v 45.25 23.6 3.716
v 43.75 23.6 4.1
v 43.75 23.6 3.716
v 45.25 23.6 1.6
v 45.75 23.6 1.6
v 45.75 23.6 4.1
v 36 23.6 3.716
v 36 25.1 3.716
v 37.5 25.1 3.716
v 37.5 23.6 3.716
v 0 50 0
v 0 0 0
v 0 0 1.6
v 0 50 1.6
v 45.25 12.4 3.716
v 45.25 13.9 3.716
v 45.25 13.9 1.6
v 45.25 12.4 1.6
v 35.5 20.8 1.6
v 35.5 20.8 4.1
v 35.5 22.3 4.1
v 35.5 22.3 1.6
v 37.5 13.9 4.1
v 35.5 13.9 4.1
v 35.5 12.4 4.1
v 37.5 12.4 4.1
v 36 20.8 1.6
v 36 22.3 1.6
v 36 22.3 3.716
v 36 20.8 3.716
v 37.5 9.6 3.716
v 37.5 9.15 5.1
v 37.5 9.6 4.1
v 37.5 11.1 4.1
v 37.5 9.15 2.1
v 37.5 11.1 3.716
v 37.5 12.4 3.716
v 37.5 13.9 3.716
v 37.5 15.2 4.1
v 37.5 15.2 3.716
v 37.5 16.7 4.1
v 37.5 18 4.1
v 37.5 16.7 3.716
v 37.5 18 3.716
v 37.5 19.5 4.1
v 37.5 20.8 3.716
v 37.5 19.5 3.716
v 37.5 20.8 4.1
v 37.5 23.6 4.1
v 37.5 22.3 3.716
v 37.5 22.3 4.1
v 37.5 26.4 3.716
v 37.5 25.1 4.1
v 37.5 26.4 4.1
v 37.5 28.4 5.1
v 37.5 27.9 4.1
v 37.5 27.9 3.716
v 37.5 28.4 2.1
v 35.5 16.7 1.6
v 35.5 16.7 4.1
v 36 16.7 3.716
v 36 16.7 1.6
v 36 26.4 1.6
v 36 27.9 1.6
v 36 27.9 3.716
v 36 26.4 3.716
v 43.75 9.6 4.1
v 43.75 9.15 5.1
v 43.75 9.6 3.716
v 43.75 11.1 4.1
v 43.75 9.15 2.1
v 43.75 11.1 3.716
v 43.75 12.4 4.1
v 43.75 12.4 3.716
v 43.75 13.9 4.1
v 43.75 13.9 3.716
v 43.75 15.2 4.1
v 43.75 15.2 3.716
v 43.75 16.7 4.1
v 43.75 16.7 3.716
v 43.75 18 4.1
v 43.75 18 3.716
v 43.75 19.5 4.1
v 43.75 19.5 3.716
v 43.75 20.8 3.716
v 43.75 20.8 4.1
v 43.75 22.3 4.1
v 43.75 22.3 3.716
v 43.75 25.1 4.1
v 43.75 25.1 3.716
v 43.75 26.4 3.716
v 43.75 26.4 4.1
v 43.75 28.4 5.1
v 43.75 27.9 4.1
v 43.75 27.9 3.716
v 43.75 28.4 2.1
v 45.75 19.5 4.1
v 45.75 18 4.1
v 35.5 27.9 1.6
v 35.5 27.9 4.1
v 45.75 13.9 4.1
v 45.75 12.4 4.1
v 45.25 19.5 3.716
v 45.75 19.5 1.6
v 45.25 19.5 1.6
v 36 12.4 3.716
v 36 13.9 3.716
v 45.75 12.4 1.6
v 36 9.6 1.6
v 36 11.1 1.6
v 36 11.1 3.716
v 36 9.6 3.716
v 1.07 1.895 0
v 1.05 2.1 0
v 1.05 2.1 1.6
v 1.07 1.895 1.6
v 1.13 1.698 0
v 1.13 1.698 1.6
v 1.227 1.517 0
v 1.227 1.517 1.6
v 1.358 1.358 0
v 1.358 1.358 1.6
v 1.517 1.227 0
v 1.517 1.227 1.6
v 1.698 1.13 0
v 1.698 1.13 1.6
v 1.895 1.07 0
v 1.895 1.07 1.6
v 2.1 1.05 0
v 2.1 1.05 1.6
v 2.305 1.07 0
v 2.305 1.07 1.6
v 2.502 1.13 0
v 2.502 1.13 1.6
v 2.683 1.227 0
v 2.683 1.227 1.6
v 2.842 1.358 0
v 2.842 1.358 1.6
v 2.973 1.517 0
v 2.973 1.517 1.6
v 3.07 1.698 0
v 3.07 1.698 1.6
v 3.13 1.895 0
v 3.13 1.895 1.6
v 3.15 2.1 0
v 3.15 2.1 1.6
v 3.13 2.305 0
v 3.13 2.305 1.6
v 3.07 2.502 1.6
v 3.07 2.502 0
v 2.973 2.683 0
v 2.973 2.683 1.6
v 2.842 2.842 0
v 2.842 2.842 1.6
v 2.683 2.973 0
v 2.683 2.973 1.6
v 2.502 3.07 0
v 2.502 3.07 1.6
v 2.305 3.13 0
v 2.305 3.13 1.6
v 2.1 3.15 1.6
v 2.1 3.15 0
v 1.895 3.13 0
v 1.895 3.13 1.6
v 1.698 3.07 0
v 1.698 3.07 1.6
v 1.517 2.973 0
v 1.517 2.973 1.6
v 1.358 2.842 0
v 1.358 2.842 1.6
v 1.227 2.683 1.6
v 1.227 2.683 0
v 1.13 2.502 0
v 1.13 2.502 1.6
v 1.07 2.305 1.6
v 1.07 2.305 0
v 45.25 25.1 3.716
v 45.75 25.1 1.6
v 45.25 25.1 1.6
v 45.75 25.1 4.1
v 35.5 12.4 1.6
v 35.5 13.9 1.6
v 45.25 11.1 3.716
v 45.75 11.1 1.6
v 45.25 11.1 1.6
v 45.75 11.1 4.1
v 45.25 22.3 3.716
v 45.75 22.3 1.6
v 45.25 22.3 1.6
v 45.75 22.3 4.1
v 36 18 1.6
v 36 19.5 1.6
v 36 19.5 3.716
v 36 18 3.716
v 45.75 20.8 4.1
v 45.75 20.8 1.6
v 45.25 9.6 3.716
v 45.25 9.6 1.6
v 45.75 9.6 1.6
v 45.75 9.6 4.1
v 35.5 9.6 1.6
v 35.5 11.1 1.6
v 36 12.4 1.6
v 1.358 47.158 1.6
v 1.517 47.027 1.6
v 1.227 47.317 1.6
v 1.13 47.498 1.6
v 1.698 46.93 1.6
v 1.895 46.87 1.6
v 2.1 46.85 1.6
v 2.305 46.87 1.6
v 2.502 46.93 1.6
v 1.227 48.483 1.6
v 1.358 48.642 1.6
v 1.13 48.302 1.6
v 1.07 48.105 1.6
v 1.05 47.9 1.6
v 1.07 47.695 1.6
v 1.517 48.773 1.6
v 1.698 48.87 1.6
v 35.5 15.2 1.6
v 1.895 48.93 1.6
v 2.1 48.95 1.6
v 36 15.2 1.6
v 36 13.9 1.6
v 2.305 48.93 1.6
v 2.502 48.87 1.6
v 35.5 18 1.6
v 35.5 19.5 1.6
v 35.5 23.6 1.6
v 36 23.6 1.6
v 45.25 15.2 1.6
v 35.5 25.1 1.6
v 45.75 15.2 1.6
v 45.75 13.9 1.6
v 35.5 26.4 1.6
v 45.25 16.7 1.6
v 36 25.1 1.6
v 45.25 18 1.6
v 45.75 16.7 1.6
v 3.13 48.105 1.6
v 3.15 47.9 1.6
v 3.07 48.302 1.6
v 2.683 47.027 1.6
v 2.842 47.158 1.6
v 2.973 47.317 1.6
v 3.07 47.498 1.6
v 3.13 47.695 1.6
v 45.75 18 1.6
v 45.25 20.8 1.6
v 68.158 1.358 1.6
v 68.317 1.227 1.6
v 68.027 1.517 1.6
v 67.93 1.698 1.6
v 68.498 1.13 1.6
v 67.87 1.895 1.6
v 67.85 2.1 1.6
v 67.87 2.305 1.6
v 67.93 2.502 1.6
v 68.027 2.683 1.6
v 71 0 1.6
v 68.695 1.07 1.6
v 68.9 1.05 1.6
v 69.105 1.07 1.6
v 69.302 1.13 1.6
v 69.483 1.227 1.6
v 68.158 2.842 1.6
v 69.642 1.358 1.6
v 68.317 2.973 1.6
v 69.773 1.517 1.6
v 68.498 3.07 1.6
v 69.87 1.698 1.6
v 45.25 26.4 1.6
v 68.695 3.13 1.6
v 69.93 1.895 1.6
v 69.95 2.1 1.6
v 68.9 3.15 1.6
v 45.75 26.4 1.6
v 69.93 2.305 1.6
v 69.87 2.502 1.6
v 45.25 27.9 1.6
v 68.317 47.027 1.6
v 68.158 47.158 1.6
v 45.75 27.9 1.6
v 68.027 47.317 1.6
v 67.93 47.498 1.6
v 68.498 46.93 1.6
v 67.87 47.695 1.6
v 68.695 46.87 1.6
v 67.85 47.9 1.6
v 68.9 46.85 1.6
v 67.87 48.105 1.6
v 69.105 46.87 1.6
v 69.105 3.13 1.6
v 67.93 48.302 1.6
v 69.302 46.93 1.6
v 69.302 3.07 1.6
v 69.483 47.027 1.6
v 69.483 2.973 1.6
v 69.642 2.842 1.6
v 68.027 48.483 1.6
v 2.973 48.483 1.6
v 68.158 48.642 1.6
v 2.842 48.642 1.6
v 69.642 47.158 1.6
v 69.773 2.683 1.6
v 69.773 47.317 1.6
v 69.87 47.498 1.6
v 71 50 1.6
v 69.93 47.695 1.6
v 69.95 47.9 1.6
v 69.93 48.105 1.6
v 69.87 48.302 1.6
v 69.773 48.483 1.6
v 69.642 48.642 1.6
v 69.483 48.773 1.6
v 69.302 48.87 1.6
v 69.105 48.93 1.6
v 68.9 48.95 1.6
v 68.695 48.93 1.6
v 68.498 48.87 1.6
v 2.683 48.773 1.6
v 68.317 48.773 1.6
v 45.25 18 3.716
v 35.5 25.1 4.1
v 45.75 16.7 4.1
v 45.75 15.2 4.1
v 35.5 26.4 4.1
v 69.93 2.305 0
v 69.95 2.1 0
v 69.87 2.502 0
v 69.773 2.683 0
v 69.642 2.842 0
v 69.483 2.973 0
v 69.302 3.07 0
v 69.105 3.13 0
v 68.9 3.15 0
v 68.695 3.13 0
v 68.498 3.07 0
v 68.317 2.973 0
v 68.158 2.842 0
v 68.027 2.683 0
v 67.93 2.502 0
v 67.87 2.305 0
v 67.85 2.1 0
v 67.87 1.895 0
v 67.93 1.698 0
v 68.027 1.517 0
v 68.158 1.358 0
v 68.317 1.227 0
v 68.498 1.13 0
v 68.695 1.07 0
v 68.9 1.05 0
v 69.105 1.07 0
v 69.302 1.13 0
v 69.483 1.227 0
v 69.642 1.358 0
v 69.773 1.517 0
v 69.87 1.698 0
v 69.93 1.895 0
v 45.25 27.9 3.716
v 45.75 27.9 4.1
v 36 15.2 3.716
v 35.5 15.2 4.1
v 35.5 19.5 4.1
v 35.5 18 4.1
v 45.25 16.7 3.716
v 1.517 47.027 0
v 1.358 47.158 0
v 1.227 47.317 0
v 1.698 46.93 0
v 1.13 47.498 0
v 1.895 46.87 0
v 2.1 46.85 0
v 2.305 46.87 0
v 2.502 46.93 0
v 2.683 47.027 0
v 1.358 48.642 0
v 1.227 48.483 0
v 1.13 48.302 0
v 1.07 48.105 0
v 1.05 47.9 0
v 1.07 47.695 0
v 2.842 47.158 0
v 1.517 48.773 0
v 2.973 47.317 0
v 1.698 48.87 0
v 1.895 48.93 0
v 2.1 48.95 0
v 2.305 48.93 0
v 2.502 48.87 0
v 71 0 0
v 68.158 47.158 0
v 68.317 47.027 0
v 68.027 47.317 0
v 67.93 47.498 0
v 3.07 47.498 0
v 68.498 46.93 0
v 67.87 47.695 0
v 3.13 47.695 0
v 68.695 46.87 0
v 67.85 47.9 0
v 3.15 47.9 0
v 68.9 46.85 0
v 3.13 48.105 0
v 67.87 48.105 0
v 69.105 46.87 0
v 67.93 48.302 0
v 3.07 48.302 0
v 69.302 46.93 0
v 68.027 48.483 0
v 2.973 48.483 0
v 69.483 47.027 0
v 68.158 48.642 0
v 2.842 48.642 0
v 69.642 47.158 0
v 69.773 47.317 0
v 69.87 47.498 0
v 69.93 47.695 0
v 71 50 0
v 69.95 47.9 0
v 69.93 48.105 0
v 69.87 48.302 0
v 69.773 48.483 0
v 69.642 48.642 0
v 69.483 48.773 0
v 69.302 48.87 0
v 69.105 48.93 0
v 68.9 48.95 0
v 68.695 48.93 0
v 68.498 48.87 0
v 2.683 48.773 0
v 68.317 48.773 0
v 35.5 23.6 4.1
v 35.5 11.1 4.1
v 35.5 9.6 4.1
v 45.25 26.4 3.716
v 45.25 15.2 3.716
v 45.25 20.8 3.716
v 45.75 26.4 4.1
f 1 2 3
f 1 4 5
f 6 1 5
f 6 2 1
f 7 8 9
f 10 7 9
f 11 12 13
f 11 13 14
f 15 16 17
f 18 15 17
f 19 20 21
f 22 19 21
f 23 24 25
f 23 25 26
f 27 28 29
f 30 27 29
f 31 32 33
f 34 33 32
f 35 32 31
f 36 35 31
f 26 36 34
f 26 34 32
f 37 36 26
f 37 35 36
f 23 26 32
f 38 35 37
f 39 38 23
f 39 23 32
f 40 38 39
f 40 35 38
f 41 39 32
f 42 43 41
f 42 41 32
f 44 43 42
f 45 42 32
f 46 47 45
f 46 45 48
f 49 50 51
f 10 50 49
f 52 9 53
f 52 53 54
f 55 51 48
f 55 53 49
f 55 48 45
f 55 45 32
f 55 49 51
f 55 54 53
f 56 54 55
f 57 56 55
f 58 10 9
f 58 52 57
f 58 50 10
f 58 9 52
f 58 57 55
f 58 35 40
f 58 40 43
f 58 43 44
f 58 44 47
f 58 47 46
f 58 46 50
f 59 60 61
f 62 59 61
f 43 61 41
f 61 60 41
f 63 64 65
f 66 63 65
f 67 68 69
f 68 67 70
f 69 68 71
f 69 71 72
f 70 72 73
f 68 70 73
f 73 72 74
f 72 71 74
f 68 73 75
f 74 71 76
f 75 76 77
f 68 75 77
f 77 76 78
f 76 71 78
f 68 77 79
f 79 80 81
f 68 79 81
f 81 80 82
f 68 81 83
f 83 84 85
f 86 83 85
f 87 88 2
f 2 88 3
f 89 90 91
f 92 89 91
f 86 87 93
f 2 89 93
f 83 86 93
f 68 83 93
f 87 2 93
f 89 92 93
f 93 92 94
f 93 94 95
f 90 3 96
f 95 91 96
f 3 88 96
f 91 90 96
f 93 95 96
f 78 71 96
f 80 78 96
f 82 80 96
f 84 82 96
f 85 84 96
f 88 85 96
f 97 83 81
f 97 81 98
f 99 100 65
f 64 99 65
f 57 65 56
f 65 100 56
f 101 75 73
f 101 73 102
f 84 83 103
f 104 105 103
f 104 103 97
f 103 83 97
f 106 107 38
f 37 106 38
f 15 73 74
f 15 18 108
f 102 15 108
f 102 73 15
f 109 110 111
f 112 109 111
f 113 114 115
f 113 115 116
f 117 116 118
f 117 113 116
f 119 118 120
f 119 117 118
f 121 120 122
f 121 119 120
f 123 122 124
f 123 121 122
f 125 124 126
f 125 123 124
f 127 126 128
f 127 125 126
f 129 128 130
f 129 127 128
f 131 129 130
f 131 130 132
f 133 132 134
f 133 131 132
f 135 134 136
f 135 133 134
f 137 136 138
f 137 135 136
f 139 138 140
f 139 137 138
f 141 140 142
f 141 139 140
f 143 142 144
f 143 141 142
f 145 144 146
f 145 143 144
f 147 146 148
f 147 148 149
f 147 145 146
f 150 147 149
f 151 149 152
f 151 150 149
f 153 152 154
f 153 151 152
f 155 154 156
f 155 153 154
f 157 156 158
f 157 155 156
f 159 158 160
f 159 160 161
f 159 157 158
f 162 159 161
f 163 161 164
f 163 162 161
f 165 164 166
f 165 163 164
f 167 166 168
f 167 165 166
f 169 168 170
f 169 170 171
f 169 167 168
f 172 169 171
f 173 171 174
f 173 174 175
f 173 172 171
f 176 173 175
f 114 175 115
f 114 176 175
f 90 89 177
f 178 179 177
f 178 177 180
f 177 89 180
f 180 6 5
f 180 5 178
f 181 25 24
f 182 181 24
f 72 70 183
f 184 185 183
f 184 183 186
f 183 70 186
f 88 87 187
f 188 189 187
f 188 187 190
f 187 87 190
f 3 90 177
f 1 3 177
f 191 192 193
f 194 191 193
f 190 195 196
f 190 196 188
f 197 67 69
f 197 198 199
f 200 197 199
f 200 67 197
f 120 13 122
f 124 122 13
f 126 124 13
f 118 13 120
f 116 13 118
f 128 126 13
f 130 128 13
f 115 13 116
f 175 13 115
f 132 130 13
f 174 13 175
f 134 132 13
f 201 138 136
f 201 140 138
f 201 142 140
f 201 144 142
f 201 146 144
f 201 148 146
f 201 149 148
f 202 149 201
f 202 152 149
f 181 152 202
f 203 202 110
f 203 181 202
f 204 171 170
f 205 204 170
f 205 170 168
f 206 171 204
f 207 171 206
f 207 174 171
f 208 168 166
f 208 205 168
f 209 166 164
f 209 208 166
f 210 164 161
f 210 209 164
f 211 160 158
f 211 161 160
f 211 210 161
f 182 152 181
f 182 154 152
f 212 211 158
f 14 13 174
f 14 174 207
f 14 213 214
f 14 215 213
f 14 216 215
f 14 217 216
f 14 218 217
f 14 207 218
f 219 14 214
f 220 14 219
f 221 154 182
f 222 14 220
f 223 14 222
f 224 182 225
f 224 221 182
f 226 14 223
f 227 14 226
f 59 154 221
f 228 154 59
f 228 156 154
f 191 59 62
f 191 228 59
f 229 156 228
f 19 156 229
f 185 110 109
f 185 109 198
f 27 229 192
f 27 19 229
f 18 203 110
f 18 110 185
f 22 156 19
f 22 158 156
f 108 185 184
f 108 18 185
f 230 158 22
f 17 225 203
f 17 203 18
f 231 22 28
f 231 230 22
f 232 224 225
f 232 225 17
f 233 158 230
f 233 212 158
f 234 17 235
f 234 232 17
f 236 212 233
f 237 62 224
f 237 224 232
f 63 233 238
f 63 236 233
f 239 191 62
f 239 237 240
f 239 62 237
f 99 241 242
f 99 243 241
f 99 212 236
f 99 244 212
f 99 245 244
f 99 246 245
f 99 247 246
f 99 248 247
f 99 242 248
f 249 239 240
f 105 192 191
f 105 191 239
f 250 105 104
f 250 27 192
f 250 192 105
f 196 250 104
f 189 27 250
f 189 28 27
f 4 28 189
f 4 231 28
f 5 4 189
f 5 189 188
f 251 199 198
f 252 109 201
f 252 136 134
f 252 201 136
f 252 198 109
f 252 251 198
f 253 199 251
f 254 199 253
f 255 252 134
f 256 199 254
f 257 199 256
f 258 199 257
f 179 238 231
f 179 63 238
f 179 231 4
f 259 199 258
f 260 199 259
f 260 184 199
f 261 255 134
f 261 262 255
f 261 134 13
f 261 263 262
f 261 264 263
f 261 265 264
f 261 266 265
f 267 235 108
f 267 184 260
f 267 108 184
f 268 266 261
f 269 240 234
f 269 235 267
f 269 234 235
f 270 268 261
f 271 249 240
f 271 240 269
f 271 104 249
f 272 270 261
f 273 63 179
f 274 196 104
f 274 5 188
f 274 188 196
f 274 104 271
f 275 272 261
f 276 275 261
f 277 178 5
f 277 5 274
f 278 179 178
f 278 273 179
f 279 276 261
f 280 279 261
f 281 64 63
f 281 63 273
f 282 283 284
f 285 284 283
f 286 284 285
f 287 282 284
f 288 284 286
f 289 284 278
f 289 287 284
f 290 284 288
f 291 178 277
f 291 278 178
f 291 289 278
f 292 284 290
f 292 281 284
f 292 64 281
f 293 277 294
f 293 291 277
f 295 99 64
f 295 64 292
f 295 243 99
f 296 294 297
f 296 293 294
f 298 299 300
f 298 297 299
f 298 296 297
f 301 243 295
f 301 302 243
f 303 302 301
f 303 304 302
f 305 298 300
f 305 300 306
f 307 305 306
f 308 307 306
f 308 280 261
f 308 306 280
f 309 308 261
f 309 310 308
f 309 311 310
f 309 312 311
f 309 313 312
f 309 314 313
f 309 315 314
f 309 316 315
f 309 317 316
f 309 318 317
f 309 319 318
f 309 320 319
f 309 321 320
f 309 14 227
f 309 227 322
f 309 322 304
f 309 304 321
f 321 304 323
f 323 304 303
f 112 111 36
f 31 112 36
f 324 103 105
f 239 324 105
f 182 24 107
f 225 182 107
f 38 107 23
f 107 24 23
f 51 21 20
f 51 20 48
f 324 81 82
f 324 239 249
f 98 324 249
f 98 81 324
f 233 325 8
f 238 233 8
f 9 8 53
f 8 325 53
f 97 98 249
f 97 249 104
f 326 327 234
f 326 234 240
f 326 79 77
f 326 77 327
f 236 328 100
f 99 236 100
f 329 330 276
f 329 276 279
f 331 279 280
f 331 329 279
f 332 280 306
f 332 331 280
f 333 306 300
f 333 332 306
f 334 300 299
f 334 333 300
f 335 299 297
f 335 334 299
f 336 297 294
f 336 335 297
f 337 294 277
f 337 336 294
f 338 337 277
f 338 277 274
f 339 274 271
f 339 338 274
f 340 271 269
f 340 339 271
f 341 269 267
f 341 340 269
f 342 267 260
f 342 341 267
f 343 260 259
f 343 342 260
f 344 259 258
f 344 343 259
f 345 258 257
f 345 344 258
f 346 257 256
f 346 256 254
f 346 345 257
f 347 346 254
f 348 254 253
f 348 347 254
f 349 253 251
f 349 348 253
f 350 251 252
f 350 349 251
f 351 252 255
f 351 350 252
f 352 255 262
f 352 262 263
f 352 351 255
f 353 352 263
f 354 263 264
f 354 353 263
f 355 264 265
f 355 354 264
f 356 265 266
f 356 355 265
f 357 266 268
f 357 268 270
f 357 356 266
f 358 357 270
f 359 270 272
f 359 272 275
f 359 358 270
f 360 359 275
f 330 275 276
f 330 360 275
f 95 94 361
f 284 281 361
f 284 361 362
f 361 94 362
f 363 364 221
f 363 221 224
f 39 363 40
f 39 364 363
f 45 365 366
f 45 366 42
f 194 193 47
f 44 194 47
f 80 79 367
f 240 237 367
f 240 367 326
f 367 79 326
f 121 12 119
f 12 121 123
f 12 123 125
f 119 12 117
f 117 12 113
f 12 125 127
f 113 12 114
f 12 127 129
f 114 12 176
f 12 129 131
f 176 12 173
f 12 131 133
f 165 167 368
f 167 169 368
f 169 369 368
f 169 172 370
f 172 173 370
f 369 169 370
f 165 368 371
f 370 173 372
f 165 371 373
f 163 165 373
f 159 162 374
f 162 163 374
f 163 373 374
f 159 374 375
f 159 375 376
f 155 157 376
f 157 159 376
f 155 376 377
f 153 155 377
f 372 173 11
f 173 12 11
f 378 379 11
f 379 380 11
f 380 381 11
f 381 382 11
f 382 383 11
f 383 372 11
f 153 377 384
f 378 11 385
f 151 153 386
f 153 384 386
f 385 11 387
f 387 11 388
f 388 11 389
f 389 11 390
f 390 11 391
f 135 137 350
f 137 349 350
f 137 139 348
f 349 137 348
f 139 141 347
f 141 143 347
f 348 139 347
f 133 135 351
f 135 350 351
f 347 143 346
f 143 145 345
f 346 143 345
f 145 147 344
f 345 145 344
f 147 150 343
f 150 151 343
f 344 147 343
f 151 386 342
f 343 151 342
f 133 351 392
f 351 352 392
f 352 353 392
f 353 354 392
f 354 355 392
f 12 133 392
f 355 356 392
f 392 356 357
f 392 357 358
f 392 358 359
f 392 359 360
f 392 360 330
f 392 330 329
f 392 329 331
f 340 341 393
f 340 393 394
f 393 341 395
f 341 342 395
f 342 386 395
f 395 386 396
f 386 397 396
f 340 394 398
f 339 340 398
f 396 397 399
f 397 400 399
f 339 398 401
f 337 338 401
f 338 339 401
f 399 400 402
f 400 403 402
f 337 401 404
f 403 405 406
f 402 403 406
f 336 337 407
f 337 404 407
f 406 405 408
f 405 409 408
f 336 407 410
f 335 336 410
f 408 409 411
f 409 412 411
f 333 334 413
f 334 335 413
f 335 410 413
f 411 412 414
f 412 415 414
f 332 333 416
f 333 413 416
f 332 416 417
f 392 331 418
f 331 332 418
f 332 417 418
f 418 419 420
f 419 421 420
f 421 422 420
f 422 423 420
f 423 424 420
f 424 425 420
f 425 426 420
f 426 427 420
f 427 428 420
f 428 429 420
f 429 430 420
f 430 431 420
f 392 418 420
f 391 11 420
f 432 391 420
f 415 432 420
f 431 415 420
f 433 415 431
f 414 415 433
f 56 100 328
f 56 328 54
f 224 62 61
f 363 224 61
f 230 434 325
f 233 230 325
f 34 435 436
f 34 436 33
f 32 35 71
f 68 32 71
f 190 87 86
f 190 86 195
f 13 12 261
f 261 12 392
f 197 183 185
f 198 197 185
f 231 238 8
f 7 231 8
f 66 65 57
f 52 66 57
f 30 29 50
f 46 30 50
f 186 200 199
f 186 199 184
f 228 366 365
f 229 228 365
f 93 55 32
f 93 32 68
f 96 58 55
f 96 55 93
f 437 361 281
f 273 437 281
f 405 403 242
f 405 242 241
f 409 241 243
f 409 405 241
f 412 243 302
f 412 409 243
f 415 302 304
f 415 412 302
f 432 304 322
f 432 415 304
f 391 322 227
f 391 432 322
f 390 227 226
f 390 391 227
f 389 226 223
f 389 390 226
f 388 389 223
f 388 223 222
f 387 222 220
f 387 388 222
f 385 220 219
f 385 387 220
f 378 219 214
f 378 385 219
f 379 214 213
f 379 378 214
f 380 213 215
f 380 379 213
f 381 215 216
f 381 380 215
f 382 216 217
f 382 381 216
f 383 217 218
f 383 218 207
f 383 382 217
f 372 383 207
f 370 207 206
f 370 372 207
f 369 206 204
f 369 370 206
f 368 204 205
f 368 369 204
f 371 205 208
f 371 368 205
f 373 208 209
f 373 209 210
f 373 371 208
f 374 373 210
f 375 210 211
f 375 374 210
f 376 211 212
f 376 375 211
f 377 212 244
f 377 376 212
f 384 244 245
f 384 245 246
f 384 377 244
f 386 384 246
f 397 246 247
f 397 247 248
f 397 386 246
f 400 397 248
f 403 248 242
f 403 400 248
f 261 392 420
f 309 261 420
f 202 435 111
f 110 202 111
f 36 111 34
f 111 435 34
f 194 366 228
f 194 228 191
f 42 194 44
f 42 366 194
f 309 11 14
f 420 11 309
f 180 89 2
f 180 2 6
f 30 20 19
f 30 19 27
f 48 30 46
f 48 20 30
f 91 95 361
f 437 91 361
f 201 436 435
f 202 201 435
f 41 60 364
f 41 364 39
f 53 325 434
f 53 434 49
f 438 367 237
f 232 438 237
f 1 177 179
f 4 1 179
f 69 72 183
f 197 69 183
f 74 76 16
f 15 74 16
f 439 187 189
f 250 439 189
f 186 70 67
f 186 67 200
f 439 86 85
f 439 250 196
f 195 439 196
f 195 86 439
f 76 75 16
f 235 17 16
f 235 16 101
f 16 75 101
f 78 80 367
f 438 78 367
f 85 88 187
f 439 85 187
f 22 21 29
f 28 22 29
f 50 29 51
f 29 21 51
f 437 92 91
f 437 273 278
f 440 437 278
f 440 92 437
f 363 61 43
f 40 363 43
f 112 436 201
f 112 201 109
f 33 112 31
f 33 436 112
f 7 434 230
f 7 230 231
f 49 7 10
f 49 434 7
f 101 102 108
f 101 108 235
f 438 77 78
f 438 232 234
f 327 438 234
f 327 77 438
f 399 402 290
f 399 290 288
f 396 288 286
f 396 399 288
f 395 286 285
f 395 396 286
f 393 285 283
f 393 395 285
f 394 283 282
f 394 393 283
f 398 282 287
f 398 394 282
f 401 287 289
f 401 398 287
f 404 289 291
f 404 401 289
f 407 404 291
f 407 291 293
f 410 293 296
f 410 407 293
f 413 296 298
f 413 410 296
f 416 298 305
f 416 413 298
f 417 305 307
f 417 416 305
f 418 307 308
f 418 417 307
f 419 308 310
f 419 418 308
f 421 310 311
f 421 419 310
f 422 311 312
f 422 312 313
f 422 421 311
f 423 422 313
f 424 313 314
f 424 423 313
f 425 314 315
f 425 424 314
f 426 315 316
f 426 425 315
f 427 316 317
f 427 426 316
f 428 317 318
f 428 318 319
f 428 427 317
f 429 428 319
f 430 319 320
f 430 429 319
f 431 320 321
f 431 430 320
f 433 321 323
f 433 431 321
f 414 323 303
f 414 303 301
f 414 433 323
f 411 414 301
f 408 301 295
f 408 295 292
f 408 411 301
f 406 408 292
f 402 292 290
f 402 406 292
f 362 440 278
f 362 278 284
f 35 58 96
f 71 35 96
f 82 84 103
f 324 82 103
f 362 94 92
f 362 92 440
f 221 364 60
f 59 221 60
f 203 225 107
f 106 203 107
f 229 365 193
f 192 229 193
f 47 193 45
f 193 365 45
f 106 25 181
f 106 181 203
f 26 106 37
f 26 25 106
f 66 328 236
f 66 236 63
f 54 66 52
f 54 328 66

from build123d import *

# Parameters (mm, degrees)
SKETCH_1_W               = 71
SKETCH_1_H               = 50
SKETCH_1_R               = 1.05
EXTRUDE_1_DEPTH          = 1.6
SKETCH_2_W               = 6.25
SKETCH_2_H               = 19.25
EXTRUDE_2_DEPTH          = 3.5
EXTRUDE_START            = -1
SKETCH_4_W               = 2
SKETCH_4_H               = 1.5
EXTRUDE_3_DEPTH          = 2.5
CUT_EXTRUDE_1_DEPTH      = 83.071508455
CUT_EXTRUDE_1_DEPTH_BACK = 83.071508455


with BuildPart() as part:
    # Эскиз1 → Бобышка-Вытянуть1 (new body)
    with BuildSketch(Plane.XY):
        with Locations((35.5, 25)):
            Rectangle(SKETCH_1_W, SKETCH_1_H)
        with Locations((2.1, 47.9)):
            Circle(SKETCH_1_R, mode=Mode.SUBTRACT)
        with Locations(Location((68.9, 47.9, 0), (0, 0, 180))):
            Circle(SKETCH_1_R, mode=Mode.SUBTRACT)
        with Locations((68.9, 2.1)):
            Circle(SKETCH_1_R, mode=Mode.SUBTRACT)
        with Locations(Location((2.1, 2.1, 0), (0, 0, 180))):
            Circle(SKETCH_1_R, mode=Mode.SUBTRACT)
    extrude(amount=EXTRUDE_1_DEPTH)

    # Эскиз2 → Бобышка-Вытянуть2 (add)
    with BuildSketch(Plane.XY.offset(1.6)):
        with Locations((40.625, 18.775)):
            Rectangle(SKETCH_2_W, SKETCH_2_H)
    extrude(amount=EXTRUDE_2_DEPTH)

    # Эскиз4 → Бобышка-Вытянуть3 (add)
    with BuildSketch(Plane.XY.offset(5.1).offset(EXTRUDE_START)):
        with Locations((36.5, 27.15)):
            Rectangle(SKETCH_4_W, SKETCH_4_H)
        with Locations((44.75, 27.15)):
            Rectangle(SKETCH_4_W, SKETCH_4_H)
        with Locations((44.75, 24.35)):
            Rectangle(SKETCH_4_W, SKETCH_4_H)
        with Locations((44.75, 21.55)):
            Rectangle(SKETCH_4_W, SKETCH_4_H)
        with Locations((44.75, 18.75)):
            Rectangle(SKETCH_4_W, SKETCH_4_H)
        with Locations((44.75, 15.95)):
            Rectangle(SKETCH_4_W, SKETCH_4_H)
        with Locations((44.75, 13.15)):
            Rectangle(SKETCH_4_W, SKETCH_4_H)
        with Locations((44.75, 10.35)):
            Rectangle(SKETCH_4_W, SKETCH_4_H)
        with Locations((36.5, 24.35)):
            Rectangle(SKETCH_4_W, SKETCH_4_H)
        with Locations((36.5, 21.55)):
            Rectangle(SKETCH_4_W, SKETCH_4_H)
        with Locations((36.5, 18.75)):
            Rectangle(SKETCH_4_W, SKETCH_4_H)
        with Locations((36.5, 15.95)):
            Rectangle(SKETCH_4_W, SKETCH_4_H)
        with Locations((36.5, 13.15)):
            Rectangle(SKETCH_4_W, SKETCH_4_H)
        with Locations((36.5, 10.35)):
            Rectangle(SKETCH_4_W, SKETCH_4_H)
    extrude(amount=-EXTRUDE_3_DEPTH)

    # Эскиз5 → Вырез-Вытянуть1 (cut, two sides: drawn at the far end of the back side and taken through both)
    with BuildSketch(Plane.XZ.offset(-9.15).offset(-CUT_EXTRUDE_1_DEPTH_BACK)):
        Polygon((36, 1.6), (36, 3.716101485), (37.5, 3.716101485), (37.5, 2.1), (43.75, 2.1), (43.75, 3.716101485), (45.25, 3.716101485), (45.25, 1.6), align=None)
    extrude(amount=CUT_EXTRUDE_1_DEPTH + CUT_EXTRUDE_1_DEPTH_BACK, mode=Mode.SUBTRACT)


solid = part.part
